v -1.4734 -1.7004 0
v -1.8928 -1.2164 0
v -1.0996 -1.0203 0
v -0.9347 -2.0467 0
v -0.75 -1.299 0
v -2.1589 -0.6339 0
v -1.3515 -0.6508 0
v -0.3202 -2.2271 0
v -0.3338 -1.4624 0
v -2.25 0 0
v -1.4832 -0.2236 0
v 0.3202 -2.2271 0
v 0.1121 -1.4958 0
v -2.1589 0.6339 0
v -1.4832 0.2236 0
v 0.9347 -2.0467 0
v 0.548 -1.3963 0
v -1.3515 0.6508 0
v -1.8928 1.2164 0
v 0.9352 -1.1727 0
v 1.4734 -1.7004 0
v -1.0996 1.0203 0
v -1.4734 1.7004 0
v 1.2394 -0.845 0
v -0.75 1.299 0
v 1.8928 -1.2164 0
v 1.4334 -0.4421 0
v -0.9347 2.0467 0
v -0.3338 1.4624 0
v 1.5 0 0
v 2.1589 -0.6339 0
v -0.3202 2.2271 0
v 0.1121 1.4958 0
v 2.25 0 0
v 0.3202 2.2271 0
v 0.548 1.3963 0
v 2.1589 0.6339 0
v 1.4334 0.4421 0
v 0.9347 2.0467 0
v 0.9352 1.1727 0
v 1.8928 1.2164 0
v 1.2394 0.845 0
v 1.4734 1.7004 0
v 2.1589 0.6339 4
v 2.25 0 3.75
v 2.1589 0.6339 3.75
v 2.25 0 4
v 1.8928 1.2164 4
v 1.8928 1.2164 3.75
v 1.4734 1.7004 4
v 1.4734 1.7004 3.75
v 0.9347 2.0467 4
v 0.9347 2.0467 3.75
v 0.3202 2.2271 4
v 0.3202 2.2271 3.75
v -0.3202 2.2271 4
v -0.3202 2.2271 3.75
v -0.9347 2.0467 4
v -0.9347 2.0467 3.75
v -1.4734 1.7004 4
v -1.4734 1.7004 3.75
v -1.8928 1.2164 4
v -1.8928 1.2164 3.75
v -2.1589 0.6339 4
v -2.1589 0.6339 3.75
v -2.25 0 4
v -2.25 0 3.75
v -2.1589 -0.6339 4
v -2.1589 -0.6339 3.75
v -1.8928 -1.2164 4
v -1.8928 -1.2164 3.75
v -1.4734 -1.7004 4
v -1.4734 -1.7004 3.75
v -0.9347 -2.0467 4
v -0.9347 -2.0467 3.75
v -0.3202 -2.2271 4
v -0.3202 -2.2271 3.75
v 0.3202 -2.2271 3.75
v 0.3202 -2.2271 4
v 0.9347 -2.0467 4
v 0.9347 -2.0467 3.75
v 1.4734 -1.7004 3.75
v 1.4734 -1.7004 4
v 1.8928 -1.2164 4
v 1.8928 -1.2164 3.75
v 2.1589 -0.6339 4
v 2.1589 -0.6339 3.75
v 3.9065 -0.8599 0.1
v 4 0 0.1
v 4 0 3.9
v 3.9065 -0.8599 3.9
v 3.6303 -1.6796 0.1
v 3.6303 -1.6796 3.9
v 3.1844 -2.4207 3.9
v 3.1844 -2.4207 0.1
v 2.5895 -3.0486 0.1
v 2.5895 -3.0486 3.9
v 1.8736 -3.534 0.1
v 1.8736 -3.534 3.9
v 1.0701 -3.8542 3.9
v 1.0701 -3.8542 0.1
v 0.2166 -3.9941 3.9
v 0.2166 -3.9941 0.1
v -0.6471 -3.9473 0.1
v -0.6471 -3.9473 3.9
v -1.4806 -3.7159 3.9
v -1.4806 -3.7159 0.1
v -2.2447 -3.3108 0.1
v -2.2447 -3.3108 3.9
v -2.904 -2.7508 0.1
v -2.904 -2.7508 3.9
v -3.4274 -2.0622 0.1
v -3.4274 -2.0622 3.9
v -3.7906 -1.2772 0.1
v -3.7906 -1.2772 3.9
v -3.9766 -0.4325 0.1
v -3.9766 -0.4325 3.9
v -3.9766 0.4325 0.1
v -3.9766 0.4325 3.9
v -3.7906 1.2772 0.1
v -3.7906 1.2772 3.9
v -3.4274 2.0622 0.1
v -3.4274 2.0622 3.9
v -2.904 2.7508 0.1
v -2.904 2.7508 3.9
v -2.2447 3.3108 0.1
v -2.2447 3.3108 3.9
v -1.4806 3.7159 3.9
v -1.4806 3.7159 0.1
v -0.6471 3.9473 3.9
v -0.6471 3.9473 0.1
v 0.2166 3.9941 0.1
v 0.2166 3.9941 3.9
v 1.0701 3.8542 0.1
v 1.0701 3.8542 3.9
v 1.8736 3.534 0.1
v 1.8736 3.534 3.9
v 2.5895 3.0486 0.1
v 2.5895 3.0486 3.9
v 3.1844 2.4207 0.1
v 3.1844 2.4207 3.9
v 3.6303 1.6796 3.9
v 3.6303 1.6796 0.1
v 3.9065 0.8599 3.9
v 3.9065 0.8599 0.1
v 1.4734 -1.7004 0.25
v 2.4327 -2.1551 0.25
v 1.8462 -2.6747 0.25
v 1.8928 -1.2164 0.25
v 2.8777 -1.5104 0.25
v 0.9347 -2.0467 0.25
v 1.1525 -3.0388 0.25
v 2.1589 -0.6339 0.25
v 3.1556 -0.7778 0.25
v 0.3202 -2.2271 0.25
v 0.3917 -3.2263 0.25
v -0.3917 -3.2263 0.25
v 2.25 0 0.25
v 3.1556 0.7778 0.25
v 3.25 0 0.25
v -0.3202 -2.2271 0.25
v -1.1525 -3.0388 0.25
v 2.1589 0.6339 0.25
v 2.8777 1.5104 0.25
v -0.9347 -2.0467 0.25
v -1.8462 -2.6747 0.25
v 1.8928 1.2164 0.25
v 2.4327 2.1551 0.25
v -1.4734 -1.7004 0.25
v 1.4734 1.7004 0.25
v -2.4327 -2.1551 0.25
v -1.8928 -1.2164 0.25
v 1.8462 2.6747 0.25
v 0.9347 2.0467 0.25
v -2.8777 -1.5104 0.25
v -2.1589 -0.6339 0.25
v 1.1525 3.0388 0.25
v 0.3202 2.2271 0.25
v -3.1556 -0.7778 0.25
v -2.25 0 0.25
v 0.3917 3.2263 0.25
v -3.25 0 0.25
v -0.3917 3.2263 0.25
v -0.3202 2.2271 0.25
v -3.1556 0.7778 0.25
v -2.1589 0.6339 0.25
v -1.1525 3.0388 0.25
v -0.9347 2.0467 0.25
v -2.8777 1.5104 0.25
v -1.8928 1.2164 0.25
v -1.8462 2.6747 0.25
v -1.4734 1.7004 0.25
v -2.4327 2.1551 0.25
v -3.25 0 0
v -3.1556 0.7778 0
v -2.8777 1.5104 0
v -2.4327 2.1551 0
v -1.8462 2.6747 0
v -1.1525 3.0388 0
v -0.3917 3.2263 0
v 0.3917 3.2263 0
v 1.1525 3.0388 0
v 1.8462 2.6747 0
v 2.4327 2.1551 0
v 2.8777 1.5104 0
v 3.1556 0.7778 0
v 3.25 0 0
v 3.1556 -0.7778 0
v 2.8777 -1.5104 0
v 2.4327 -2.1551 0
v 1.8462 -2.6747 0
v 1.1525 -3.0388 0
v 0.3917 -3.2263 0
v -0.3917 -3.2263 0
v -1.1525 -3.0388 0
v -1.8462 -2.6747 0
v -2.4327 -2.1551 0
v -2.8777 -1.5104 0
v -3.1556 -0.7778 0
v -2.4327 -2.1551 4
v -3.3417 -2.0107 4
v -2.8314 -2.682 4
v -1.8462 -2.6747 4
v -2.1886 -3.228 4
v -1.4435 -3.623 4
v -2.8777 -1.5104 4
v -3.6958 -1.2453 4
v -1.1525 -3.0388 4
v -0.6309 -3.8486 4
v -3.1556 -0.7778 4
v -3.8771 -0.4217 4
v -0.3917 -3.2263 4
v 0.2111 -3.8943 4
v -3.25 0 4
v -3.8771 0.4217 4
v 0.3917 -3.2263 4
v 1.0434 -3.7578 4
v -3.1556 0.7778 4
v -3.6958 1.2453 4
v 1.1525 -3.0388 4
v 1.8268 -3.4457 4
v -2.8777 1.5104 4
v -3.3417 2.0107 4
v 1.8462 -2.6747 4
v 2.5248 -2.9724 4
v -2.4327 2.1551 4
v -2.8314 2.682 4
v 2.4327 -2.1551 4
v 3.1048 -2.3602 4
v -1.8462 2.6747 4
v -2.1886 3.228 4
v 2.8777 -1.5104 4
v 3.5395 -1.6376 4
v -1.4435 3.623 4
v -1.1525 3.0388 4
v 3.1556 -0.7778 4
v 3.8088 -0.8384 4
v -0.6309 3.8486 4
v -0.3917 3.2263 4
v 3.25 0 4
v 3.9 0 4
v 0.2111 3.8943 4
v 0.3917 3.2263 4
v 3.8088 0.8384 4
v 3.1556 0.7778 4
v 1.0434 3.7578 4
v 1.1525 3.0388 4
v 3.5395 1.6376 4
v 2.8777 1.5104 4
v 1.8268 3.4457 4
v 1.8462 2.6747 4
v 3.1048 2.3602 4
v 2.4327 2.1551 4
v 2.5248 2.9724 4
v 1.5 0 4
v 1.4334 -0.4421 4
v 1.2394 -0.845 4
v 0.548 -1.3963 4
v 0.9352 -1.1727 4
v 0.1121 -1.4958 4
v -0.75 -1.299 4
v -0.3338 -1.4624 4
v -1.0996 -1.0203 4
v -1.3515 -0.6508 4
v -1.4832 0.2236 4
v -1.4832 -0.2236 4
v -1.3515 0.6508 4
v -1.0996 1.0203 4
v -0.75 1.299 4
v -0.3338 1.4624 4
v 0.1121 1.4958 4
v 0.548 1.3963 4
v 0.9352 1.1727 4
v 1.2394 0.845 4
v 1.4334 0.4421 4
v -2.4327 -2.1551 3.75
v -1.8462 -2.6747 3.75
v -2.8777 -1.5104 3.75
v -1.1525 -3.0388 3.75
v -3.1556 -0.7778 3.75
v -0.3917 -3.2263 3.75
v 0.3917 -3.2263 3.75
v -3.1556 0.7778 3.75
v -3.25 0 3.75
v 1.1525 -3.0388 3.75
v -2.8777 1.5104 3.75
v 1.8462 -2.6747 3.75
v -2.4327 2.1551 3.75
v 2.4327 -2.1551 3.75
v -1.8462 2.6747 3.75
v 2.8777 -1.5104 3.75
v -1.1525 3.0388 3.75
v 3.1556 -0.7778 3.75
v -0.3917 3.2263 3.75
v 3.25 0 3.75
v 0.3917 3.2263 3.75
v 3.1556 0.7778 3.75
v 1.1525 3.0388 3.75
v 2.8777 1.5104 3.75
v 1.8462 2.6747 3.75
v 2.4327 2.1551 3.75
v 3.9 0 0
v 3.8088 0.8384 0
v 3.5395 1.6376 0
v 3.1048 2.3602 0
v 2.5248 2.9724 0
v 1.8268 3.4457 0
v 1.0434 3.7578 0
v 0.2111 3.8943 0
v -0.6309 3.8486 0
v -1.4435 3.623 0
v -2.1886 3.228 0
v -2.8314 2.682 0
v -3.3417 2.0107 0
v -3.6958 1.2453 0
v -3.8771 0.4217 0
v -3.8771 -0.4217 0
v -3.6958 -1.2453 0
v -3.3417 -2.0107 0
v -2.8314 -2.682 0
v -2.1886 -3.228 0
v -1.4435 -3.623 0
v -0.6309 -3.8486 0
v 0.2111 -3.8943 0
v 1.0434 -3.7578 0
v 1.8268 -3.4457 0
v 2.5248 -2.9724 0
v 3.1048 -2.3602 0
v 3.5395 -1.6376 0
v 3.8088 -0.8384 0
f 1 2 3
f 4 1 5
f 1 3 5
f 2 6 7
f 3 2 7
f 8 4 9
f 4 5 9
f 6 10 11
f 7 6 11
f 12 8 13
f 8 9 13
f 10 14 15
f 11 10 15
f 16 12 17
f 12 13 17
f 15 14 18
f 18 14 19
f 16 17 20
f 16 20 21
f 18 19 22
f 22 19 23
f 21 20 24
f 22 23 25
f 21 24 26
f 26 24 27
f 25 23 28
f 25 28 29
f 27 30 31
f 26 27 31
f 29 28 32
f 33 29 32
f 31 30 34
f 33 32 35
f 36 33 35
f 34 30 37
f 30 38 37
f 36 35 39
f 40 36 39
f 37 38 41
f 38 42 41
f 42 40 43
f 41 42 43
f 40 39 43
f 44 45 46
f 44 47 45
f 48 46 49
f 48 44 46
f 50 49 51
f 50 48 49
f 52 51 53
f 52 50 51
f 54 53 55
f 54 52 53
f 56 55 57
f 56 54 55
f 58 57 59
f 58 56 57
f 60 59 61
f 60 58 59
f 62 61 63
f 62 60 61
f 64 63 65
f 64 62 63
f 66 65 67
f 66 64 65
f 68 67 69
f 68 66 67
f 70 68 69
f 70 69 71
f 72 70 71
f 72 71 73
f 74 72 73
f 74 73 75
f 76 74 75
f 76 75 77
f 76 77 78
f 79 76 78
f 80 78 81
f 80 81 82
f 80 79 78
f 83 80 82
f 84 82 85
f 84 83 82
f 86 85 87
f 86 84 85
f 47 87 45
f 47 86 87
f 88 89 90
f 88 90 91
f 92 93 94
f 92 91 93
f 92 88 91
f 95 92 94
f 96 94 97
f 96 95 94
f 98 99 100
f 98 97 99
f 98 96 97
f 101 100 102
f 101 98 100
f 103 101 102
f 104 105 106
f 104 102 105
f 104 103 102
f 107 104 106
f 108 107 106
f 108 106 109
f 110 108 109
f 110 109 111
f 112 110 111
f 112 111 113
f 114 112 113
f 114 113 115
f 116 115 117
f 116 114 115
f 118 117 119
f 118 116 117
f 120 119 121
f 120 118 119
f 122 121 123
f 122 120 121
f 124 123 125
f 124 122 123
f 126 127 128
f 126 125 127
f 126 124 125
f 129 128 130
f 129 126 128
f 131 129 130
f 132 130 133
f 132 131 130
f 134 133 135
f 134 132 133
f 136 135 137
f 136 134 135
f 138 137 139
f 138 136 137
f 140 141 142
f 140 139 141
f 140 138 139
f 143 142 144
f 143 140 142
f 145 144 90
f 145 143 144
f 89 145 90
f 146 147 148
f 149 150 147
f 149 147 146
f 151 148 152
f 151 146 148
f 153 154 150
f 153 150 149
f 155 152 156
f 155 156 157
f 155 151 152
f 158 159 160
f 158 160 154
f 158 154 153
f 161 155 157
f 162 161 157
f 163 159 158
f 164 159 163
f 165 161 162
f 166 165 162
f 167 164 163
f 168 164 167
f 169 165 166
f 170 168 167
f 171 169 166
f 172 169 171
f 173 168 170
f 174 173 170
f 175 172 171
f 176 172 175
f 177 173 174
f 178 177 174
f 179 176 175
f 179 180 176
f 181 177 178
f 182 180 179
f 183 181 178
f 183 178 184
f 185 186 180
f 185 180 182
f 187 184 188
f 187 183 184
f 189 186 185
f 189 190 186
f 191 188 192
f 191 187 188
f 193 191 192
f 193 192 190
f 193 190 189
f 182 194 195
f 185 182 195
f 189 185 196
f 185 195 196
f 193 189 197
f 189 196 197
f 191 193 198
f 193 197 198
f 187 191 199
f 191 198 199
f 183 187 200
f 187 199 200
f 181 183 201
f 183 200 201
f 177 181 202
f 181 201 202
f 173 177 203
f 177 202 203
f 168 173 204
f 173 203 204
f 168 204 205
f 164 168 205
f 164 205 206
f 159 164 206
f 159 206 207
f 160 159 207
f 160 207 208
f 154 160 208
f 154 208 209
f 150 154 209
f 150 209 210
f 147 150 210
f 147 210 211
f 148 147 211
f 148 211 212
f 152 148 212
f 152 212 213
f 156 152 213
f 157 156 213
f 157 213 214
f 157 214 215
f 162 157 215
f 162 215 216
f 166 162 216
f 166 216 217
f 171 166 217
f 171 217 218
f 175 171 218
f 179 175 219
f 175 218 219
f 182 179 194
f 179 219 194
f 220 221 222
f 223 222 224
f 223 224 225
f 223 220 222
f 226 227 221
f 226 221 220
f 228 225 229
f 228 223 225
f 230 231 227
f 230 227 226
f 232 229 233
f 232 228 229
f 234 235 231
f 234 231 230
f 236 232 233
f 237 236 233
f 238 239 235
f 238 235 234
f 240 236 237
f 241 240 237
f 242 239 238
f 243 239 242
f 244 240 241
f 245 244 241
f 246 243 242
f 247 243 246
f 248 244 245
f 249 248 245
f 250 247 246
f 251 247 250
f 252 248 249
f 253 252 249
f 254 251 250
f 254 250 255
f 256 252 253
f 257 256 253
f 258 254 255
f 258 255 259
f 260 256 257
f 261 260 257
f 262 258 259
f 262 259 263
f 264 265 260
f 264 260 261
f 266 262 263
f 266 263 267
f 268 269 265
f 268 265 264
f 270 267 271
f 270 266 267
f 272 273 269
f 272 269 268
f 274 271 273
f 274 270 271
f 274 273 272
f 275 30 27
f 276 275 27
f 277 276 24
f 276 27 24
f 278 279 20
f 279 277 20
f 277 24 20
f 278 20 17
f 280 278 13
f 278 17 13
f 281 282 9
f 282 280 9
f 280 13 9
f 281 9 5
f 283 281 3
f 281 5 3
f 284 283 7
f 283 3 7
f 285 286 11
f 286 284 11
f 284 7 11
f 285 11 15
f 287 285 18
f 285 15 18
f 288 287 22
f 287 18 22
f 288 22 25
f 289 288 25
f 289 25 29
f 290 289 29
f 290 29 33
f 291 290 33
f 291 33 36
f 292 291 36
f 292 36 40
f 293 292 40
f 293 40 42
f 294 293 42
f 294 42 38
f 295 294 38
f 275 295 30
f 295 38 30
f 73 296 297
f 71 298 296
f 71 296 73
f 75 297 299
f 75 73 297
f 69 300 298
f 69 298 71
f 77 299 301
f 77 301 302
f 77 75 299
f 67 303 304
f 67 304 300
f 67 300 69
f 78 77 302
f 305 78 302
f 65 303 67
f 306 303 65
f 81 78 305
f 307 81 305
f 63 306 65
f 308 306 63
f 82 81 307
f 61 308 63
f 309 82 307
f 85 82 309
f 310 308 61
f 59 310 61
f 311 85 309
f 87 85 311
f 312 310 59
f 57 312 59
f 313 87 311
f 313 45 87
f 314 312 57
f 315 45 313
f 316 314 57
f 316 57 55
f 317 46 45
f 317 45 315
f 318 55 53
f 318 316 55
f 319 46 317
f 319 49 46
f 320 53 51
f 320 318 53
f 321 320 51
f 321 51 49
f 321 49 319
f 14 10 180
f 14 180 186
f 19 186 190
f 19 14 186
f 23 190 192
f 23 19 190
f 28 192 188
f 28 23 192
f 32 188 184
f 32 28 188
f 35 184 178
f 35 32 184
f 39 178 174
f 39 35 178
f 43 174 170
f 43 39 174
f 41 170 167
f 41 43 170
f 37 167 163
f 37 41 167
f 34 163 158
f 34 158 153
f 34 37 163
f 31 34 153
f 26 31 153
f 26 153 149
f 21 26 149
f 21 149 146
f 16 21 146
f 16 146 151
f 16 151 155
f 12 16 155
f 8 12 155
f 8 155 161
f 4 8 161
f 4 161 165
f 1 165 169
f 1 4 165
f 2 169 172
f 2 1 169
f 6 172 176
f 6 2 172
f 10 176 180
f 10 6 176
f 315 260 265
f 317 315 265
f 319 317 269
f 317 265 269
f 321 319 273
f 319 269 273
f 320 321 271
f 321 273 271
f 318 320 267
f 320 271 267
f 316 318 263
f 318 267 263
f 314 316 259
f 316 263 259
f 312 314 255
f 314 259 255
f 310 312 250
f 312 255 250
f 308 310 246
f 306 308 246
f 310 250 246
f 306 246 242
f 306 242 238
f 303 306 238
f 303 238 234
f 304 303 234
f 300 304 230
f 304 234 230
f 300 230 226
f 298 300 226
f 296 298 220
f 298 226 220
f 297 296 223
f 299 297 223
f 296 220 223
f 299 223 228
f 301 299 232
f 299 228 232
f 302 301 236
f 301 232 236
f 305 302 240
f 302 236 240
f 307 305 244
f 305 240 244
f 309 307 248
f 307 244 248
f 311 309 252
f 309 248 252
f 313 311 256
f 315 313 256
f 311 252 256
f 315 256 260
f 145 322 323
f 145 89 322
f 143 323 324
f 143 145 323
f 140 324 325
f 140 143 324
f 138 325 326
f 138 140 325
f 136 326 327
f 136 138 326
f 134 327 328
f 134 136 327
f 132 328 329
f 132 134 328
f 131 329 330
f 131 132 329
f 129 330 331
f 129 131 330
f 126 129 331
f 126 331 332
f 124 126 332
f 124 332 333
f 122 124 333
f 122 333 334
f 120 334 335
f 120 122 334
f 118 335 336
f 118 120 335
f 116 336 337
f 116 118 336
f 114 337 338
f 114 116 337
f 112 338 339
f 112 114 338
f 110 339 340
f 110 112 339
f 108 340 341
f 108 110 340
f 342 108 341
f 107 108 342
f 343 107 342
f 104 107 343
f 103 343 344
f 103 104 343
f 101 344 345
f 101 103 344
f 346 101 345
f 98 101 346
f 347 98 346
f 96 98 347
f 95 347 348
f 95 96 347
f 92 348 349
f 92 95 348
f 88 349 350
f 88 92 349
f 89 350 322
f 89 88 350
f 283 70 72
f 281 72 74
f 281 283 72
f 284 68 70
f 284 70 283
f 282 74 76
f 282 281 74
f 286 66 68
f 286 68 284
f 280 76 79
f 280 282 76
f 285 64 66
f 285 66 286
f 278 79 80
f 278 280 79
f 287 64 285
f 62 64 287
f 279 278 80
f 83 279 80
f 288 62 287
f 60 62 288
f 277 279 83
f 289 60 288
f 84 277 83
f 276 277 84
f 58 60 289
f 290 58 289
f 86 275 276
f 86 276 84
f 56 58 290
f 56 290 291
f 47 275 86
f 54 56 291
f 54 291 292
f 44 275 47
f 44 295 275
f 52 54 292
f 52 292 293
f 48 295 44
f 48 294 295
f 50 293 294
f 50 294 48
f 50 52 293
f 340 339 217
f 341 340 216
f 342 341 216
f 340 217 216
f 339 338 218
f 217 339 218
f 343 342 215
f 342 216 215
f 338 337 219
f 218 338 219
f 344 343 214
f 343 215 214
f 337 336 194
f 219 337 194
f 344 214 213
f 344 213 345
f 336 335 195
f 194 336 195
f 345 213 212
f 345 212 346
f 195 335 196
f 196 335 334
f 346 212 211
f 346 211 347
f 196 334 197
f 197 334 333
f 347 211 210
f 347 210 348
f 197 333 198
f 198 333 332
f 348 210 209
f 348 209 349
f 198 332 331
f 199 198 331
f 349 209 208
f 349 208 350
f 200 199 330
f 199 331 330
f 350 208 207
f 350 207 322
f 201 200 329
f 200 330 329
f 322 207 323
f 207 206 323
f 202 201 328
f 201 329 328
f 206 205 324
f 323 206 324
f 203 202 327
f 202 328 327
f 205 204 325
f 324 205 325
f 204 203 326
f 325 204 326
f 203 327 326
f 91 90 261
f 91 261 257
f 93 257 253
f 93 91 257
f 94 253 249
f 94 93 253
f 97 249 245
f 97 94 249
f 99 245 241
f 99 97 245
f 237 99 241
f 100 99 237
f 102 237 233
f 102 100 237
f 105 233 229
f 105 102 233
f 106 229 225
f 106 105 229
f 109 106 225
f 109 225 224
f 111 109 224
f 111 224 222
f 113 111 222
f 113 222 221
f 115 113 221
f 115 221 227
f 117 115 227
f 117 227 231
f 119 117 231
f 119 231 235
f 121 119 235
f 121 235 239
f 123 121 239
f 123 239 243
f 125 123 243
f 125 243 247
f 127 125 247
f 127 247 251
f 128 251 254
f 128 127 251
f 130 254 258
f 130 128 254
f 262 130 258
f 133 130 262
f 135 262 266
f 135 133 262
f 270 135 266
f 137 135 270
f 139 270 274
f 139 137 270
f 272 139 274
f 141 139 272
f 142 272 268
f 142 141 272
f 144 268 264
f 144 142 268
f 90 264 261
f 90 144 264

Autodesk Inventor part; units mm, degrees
ref_plane "YZ Plane" through (0, 0, 0) normal (1, 0, 0) x (0, 1, 0)
ref_plane "XZ Plane" through (0, 0, 0) normal (0, 1, 0) x (-1, 0, 0)
ref_plane "XY Plane" through (0, 0, 0) normal (0, 0, 1) x (1, 0, 0)
sketch "Sketch1" plane through (0, 0, 0) normal (0, 0, 1) x (1, 0, 0)
  circle A0 centre (0, 0) radius 1.5
  circle A1 centre (0, 0) radius 4
  dimension "d0" = 3
  dimension "d1" = 8
extrude "Extrusion1" add sketch "Sketch1" along normal blind 4
sketch "Sketch2" plane through (0, 0, 4) normal (0, 0, 1) x (1, 0, 0)
  circle A0 centre (0, 0) radius 1.5 projected
  circle A1 centre (0, 0) radius 4 projected
  circle A2 centre (0, 0) radius 2.25
  circle A3 centre (0, 0) radius 3.25
  dimension "d4" = 0.75
  dimension "d5" = 0.75
extrude "Extrusion2" cut sketch "Sketch2" against normal blind 0.25 contours A3
sketch "Sketch3" plane through (0, 0, 0) normal (0, 0, -1) x (-1, 0, 0)
  circle A0 centre (0, 0) radius 1.5 projected
  circle A1 centre (0, 0) radius 4 projected
  circle A2 centre (0, 0) radius 2.25
  circle A3 centre (0, 0) radius 3.25
  dimension "d8" = 0.75
  dimension "d9" = 0.75
extrude "Extrusion3" cut sketch "Sketch3" against normal blind 0.25 contours A3
chamfer "Chamfer1" distance 0.1 angle 45 2 edges at (-4, 0, 4) (-4, 0, 0)
properties part number "3x8x4_bearing"
